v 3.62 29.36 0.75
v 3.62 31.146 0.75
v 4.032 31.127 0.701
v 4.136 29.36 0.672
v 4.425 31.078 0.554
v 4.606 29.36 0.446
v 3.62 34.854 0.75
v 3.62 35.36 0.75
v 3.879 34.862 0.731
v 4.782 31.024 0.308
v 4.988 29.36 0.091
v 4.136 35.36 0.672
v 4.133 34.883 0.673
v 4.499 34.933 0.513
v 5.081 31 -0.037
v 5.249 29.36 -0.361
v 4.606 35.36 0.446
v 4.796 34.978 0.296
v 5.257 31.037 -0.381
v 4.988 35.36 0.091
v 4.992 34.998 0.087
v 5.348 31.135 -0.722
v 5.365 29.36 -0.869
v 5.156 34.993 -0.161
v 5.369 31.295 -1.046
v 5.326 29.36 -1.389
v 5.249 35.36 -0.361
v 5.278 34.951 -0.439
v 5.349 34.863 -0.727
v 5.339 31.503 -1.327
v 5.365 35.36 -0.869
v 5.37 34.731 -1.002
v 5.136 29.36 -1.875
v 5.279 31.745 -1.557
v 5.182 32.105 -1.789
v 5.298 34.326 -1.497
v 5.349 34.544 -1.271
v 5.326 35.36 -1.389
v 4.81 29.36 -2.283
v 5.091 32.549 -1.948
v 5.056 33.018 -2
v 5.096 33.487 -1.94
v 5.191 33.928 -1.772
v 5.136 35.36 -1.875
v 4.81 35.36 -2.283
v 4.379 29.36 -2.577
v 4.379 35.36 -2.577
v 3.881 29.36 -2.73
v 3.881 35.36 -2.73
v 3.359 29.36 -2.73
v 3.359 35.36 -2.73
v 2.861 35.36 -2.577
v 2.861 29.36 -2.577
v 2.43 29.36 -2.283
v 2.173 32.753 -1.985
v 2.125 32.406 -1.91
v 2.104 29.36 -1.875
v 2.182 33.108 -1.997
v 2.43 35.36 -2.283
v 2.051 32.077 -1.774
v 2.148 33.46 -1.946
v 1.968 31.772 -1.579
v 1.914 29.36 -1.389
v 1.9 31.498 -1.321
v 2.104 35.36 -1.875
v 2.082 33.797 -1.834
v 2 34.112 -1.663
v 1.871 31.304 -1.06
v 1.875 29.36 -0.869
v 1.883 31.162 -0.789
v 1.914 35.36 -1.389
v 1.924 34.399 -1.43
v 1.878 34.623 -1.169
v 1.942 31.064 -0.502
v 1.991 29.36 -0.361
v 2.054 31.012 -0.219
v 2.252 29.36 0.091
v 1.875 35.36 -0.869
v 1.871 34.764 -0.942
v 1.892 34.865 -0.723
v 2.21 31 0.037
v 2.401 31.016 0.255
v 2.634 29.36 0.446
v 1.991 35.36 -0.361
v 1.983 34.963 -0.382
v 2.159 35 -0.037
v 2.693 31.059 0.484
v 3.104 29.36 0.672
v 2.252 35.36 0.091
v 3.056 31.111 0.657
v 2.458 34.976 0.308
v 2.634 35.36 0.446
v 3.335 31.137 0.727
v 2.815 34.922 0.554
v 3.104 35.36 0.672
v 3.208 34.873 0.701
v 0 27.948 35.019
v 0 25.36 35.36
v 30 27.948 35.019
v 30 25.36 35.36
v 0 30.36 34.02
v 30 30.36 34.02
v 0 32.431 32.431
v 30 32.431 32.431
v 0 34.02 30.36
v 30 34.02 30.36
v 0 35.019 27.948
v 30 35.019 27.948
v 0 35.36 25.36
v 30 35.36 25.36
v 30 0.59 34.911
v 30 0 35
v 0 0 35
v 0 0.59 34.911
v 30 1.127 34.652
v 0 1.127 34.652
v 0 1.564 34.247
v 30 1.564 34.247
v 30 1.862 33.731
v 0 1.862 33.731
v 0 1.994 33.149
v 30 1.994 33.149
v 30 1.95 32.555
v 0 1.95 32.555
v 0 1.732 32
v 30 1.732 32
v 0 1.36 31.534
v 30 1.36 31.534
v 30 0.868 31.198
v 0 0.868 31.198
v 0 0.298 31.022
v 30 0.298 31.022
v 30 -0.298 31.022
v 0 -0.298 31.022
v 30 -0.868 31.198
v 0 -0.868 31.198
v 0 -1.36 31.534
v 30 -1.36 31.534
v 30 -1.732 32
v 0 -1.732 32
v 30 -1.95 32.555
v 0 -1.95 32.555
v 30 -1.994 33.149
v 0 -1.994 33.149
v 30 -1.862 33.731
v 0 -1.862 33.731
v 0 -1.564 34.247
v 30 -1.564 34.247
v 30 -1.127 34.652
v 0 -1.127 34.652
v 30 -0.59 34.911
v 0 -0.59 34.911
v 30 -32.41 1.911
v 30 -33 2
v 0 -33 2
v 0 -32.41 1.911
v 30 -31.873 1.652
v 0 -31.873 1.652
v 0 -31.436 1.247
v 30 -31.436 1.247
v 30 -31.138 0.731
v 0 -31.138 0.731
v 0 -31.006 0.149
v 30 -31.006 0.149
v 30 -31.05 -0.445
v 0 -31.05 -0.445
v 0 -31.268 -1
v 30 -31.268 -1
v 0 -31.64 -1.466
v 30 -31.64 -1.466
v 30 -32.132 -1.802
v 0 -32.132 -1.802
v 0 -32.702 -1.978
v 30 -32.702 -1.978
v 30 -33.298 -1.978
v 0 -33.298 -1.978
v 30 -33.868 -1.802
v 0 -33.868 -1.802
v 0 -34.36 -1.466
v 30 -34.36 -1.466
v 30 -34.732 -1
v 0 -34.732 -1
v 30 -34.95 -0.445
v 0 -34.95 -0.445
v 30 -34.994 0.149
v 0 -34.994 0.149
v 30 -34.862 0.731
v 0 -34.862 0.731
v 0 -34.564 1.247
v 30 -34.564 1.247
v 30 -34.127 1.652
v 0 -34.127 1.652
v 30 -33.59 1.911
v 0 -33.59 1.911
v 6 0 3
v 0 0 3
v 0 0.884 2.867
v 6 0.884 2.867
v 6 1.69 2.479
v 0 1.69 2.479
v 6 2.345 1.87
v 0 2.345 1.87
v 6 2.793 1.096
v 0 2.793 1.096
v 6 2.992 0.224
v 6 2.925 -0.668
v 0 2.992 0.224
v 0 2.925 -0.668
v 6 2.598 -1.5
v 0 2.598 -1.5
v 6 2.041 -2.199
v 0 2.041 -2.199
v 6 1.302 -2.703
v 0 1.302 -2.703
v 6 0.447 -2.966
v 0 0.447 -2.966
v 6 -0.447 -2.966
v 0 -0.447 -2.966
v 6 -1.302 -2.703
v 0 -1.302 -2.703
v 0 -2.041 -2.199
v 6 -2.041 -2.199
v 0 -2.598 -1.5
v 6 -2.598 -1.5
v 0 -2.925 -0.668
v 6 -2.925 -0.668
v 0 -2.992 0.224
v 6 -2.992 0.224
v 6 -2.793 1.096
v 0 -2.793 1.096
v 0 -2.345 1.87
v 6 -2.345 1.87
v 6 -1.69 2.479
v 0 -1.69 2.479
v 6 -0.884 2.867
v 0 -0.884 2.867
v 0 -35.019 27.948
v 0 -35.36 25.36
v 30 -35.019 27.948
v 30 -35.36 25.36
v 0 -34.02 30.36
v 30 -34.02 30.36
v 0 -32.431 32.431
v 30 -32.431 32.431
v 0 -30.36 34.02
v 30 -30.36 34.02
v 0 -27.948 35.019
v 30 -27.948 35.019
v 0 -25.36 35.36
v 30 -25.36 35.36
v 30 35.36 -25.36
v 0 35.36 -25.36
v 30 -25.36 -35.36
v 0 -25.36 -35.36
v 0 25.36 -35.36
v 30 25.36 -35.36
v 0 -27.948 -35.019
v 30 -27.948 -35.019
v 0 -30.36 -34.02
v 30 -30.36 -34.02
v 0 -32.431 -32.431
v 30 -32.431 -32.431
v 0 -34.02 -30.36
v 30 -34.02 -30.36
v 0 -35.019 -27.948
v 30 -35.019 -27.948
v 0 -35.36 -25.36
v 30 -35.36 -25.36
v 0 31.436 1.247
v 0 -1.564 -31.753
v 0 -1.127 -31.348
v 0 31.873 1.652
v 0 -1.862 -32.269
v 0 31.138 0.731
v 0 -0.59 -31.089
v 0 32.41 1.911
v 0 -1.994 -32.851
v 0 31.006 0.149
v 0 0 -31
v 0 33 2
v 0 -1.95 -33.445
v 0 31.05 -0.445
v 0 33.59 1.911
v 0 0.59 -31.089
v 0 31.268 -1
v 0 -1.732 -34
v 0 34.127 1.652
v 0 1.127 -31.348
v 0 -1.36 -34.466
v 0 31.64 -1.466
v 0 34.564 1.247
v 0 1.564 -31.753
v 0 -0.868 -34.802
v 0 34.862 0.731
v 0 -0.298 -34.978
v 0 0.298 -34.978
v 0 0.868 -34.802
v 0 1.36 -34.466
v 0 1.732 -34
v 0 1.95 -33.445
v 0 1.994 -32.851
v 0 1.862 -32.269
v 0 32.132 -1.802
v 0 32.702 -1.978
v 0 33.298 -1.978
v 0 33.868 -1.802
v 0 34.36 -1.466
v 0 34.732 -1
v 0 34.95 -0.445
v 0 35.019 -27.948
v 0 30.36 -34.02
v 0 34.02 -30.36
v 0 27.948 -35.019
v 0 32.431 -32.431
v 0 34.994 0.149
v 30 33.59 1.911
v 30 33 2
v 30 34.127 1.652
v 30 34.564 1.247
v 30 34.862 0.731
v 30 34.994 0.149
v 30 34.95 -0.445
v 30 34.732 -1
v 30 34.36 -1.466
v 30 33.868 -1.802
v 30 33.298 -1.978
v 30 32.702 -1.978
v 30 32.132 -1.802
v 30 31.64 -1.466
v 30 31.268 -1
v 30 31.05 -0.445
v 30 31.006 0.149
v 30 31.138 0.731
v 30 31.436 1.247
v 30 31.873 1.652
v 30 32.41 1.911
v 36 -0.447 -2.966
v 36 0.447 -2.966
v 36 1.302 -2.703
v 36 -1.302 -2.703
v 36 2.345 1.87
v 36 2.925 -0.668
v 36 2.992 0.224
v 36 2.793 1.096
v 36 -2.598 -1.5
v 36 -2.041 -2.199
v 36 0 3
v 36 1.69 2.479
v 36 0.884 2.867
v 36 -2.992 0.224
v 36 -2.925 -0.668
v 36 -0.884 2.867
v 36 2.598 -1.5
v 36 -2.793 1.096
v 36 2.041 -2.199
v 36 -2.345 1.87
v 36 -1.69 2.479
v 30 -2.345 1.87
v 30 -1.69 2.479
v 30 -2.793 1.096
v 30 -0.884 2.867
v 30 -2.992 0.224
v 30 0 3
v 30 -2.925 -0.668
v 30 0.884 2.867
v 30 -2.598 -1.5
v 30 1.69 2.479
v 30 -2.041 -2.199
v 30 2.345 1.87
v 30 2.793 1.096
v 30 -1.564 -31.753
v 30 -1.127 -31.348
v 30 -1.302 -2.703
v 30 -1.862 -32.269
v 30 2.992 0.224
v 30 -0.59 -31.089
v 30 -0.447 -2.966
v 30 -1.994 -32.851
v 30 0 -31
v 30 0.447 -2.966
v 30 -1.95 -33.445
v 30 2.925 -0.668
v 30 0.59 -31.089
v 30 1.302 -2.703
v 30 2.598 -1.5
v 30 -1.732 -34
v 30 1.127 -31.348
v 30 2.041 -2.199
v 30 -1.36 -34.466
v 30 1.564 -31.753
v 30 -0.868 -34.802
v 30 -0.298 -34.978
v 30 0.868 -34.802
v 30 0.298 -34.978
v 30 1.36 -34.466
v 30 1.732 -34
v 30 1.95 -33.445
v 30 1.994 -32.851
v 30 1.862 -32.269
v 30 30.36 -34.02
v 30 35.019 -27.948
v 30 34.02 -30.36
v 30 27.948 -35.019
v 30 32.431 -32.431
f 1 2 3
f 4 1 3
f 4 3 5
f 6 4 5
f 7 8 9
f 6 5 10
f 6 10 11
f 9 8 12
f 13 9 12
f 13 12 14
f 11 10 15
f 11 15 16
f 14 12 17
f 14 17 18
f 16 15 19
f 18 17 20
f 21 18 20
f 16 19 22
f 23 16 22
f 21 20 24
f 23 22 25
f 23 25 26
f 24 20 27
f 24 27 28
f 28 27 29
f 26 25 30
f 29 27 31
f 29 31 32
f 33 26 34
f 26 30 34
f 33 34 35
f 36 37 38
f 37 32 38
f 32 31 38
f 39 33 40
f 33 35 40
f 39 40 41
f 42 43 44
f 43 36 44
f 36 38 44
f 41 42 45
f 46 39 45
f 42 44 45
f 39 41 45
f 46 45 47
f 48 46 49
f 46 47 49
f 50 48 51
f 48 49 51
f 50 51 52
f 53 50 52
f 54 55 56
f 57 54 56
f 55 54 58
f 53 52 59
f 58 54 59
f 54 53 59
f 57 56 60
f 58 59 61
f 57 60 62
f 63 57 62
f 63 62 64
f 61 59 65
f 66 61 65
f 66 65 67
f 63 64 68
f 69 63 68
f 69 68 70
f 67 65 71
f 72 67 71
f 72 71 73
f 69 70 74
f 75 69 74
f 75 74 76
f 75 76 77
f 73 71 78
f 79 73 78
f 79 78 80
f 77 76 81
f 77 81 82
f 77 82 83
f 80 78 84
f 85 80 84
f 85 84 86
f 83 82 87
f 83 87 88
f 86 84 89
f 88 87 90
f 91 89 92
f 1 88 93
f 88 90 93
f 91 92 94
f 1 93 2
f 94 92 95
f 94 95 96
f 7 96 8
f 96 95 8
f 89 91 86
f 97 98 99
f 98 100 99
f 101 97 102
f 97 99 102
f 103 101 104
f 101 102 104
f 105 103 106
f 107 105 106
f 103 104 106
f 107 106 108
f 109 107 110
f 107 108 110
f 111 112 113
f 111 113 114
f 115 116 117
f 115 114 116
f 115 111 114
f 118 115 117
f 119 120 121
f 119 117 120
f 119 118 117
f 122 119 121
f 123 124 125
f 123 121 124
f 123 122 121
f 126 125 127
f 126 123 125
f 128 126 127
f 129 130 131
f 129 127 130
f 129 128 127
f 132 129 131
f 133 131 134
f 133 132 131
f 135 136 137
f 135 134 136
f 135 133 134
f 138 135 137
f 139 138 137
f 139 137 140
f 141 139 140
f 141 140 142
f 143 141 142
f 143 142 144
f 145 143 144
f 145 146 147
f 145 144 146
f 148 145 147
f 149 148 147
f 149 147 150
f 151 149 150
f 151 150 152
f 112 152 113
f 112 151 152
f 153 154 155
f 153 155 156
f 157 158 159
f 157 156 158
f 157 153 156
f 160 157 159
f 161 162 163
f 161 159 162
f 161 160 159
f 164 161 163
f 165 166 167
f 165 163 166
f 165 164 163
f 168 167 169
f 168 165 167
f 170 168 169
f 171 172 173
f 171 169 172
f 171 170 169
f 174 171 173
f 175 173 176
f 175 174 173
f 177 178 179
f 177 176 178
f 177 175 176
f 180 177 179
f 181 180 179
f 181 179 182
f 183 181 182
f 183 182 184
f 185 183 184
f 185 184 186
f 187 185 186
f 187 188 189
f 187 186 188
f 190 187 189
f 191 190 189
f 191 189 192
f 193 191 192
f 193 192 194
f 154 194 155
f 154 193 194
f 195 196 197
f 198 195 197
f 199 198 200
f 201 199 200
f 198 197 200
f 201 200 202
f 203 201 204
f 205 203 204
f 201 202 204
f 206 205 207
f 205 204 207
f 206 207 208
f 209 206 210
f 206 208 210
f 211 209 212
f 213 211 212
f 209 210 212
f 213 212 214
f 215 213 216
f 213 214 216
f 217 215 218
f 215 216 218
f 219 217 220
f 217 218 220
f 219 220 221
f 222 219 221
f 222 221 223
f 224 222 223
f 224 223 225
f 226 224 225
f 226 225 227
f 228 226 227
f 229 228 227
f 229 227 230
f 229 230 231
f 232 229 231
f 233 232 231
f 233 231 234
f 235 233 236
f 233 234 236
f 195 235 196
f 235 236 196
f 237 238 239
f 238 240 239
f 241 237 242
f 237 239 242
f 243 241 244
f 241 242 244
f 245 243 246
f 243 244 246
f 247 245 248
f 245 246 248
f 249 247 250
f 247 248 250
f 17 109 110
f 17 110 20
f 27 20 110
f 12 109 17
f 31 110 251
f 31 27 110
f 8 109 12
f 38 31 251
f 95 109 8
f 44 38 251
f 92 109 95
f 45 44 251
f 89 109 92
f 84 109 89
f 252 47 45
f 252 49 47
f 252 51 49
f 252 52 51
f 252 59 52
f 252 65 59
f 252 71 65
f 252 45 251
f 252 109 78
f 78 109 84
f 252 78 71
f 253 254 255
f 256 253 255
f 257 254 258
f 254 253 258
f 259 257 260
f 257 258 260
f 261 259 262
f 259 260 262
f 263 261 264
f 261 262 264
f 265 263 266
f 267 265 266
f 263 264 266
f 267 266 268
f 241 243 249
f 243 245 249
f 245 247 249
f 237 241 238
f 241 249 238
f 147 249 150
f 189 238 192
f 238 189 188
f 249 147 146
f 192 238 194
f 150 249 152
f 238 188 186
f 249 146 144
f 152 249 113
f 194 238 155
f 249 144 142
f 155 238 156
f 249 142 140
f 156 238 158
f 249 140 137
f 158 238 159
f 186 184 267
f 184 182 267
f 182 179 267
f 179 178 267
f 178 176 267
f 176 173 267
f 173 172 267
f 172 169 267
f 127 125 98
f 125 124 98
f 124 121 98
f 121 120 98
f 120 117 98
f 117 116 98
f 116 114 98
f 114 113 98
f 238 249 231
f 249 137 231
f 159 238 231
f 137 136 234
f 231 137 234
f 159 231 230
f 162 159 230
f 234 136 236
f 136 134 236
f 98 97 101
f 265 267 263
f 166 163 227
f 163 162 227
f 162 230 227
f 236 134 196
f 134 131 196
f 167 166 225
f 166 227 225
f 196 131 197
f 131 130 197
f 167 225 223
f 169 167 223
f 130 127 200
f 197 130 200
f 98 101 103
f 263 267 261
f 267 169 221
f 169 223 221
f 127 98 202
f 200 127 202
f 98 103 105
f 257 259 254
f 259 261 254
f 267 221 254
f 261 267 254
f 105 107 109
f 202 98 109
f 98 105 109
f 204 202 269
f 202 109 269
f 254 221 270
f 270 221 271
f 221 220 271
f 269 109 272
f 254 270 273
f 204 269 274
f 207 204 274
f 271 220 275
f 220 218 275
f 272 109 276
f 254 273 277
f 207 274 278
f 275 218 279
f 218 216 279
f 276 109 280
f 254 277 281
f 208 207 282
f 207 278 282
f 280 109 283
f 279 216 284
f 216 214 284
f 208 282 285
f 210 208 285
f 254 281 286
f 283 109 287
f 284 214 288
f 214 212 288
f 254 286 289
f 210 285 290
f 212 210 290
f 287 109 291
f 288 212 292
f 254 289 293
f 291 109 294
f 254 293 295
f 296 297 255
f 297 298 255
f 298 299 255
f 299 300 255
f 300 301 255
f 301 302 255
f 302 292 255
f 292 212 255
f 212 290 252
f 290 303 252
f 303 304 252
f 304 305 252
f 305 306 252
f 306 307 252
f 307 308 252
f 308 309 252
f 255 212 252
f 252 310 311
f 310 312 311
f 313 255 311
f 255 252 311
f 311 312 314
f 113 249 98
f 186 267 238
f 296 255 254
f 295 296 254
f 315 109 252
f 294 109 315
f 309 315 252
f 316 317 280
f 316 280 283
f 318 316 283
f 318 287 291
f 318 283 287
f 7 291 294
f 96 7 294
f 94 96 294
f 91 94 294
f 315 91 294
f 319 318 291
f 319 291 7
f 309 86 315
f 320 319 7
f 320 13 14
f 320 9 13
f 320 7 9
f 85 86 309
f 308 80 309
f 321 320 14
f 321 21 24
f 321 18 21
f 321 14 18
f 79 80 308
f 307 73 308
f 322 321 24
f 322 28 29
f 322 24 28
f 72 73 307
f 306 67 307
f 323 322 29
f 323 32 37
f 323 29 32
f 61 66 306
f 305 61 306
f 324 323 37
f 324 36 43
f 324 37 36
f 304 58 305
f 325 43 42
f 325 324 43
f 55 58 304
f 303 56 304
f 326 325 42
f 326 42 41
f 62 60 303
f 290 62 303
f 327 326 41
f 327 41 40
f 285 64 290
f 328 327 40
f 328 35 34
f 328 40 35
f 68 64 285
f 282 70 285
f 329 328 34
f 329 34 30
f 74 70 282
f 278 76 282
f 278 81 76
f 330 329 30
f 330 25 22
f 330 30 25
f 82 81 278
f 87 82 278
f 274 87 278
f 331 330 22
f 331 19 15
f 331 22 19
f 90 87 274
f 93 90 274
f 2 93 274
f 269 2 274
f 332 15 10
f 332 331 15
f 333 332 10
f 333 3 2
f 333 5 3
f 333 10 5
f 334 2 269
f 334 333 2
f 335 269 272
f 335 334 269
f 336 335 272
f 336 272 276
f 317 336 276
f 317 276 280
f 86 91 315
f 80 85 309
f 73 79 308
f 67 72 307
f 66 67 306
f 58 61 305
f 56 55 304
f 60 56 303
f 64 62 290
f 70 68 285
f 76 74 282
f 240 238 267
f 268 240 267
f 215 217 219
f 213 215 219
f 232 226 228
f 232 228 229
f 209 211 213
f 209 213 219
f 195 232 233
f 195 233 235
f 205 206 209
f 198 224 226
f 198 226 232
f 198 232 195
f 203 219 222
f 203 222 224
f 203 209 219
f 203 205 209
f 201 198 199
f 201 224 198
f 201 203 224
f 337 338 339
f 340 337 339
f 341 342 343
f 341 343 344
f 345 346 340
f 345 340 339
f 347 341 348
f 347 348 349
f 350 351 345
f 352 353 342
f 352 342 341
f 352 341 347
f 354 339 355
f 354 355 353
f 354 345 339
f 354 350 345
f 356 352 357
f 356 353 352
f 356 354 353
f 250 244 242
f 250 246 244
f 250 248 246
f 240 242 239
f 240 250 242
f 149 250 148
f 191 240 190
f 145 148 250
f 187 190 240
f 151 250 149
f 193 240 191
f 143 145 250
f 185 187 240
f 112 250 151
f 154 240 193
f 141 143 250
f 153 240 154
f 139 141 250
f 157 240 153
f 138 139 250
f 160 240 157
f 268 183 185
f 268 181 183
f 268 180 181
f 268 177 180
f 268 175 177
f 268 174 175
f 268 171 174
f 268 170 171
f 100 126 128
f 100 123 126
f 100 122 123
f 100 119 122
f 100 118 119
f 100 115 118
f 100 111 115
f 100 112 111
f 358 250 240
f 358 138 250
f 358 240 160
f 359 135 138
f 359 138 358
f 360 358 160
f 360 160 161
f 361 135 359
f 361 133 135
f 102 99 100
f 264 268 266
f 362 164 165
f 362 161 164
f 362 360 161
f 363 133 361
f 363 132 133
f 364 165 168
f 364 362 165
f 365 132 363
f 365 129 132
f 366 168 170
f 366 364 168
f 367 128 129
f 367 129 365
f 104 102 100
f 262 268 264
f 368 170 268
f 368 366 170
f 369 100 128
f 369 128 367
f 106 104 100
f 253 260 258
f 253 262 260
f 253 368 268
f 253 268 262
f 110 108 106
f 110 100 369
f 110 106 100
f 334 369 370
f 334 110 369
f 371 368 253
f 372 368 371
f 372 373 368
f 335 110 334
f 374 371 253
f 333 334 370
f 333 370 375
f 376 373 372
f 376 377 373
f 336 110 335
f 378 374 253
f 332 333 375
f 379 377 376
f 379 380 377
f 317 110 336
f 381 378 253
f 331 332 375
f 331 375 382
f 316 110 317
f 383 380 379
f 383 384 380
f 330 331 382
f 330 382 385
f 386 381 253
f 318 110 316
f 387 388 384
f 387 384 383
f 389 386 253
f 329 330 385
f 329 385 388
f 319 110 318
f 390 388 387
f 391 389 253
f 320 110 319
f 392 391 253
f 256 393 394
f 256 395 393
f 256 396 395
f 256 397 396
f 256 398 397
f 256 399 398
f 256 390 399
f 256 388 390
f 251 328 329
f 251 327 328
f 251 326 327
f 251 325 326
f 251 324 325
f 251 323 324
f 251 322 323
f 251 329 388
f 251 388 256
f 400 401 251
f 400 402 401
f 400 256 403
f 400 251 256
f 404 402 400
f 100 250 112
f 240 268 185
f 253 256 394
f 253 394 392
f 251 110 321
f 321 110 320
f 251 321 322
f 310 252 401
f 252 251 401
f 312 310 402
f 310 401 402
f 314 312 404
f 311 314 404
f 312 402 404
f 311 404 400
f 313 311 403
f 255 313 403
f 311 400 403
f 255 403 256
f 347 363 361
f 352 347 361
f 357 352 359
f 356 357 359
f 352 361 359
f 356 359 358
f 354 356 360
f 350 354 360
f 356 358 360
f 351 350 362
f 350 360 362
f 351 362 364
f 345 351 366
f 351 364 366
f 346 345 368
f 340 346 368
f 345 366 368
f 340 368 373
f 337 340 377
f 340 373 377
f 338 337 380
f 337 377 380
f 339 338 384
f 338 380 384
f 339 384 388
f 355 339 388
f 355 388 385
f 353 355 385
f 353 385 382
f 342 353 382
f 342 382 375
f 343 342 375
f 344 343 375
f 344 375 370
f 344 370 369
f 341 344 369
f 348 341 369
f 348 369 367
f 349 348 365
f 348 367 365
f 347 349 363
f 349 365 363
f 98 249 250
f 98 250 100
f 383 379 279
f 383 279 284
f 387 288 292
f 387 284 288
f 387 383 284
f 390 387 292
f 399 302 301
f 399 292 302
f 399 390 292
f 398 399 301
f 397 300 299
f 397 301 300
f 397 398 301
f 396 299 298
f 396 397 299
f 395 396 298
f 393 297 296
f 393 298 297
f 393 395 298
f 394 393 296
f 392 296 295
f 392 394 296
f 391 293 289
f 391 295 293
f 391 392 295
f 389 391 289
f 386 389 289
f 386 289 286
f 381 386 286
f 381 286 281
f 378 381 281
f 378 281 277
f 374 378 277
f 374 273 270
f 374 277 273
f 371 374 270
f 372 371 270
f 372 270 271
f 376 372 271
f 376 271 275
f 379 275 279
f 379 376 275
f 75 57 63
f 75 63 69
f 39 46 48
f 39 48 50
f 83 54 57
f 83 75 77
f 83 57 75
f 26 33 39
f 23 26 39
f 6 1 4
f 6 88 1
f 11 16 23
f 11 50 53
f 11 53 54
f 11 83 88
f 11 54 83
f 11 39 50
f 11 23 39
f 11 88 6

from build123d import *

# Parameters (mm, degrees)
SKETCH_1_W               = 70.72
SKETCH_1_H               = 70.72
EXTRUDE_1_DEPTH          = 30
SKETCH_2_R               = 3
CUT_EXTRUDE_1_DEPTH      = 6
SKETCH_3_R               = 3
EXTRUDE_2_DEPTH          = 6
SKETCH_5_R               = 1.75
CUT_EXTRUDE_2_DEPTH      = 6
CUT_EXTRUDE_3_DEPTH      = 59.315171268
CUT_EXTRUDE_3_DEPTH_BACK = 59.315171268
SKETCH_7_R               = 2
FILLET_1_R               = 10
FILLET_2_R               = 10
FILLET_3_R               = 10
FILLET_4_R               = 10


with BuildPart() as part:
    # 草图1 → 凸台-拉伸1 (new body)
    with BuildSketch(Plane(origin=(0, 0, 0), x_dir=(0, 0, -1), z_dir=(1, 0, 0))):
        Rectangle(SKETCH_1_W, SKETCH_1_H)
    extrude(amount=EXTRUDE_1_DEPTH)

    # 草图2 → 切除-拉伸1 (cut)
    with BuildSketch(Plane.ZY):
        Circle(SKETCH_2_R)
    extrude(amount=-CUT_EXTRUDE_1_DEPTH, mode=Mode.SUBTRACT)

    # 草图3 → 凸台-拉伸2 (add)
    with BuildSketch(Plane(origin=(30, 0, 0), x_dir=(0, 0, -1), z_dir=(1, 0, 0))):
        with Locations(Location((0, 0, 0), (0, 0, 180))):
            Circle(SKETCH_3_R)
    extrude(amount=EXTRUDE_2_DEPTH)

    # 草图5 → 切除-拉伸2 (cut)
    with BuildSketch(Plane(origin=(0, 35.36, 0), x_dir=(1, 0, 0), z_dir=(0, 1, 0))):
        with Locations(Location((3.62, 1, 0), (0, 0, 270))):
            Circle(SKETCH_5_R)
    extrude(amount=-CUT_EXTRUDE_2_DEPTH, mode=Mode.SUBTRACT)

    # 草图7 → 切除-拉伸3 (cut, two sides: drawn at the far end of the back side and taken through both)
    with BuildSketch(Plane.ZY.offset(-6).offset(-CUT_EXTRUDE_3_DEPTH_BACK)):
        with Locations((0, 33)):
            Circle(SKETCH_7_R)
        with Locations((33, 0)):
            Circle(SKETCH_7_R)
        with Locations((0, -33)):
            Circle(SKETCH_7_R)
        with Locations((-33, 0)):
            Circle(SKETCH_7_R)
    extrude(amount=CUT_EXTRUDE_3_DEPTH + CUT_EXTRUDE_3_DEPTH_BACK, mode=Mode.SUBTRACT)

    # 圆角1
    fillet_1_edges = [part.edges().sort_by_distance(p)[0] for p in [
        (15, 35.36, -35.36),
    ]]
    fillet(fillet_1_edges, radius=FILLET_1_R)

    # 圆角2
    fillet_2_edges = [part.edges().sort_by_distance(p)[0] for p in [
        (15, -35.36, -35.36),
    ]]
    fillet(fillet_2_edges, radius=FILLET_2_R)

    # 圆角3
    fillet_3_edges = [part.edges().sort_by_distance(p)[0] for p in [
        (15, -35.36, 35.36),
    ]]
    fillet(fillet_3_edges, radius=FILLET_3_R)

    # 圆角4
    fillet_4_edges = [part.edges().sort_by_distance(p)[0] for p in [
        (15, 35.36, 35.36),
    ]]
    fillet(fillet_4_edges, radius=FILLET_4_R)


solid = part.part
